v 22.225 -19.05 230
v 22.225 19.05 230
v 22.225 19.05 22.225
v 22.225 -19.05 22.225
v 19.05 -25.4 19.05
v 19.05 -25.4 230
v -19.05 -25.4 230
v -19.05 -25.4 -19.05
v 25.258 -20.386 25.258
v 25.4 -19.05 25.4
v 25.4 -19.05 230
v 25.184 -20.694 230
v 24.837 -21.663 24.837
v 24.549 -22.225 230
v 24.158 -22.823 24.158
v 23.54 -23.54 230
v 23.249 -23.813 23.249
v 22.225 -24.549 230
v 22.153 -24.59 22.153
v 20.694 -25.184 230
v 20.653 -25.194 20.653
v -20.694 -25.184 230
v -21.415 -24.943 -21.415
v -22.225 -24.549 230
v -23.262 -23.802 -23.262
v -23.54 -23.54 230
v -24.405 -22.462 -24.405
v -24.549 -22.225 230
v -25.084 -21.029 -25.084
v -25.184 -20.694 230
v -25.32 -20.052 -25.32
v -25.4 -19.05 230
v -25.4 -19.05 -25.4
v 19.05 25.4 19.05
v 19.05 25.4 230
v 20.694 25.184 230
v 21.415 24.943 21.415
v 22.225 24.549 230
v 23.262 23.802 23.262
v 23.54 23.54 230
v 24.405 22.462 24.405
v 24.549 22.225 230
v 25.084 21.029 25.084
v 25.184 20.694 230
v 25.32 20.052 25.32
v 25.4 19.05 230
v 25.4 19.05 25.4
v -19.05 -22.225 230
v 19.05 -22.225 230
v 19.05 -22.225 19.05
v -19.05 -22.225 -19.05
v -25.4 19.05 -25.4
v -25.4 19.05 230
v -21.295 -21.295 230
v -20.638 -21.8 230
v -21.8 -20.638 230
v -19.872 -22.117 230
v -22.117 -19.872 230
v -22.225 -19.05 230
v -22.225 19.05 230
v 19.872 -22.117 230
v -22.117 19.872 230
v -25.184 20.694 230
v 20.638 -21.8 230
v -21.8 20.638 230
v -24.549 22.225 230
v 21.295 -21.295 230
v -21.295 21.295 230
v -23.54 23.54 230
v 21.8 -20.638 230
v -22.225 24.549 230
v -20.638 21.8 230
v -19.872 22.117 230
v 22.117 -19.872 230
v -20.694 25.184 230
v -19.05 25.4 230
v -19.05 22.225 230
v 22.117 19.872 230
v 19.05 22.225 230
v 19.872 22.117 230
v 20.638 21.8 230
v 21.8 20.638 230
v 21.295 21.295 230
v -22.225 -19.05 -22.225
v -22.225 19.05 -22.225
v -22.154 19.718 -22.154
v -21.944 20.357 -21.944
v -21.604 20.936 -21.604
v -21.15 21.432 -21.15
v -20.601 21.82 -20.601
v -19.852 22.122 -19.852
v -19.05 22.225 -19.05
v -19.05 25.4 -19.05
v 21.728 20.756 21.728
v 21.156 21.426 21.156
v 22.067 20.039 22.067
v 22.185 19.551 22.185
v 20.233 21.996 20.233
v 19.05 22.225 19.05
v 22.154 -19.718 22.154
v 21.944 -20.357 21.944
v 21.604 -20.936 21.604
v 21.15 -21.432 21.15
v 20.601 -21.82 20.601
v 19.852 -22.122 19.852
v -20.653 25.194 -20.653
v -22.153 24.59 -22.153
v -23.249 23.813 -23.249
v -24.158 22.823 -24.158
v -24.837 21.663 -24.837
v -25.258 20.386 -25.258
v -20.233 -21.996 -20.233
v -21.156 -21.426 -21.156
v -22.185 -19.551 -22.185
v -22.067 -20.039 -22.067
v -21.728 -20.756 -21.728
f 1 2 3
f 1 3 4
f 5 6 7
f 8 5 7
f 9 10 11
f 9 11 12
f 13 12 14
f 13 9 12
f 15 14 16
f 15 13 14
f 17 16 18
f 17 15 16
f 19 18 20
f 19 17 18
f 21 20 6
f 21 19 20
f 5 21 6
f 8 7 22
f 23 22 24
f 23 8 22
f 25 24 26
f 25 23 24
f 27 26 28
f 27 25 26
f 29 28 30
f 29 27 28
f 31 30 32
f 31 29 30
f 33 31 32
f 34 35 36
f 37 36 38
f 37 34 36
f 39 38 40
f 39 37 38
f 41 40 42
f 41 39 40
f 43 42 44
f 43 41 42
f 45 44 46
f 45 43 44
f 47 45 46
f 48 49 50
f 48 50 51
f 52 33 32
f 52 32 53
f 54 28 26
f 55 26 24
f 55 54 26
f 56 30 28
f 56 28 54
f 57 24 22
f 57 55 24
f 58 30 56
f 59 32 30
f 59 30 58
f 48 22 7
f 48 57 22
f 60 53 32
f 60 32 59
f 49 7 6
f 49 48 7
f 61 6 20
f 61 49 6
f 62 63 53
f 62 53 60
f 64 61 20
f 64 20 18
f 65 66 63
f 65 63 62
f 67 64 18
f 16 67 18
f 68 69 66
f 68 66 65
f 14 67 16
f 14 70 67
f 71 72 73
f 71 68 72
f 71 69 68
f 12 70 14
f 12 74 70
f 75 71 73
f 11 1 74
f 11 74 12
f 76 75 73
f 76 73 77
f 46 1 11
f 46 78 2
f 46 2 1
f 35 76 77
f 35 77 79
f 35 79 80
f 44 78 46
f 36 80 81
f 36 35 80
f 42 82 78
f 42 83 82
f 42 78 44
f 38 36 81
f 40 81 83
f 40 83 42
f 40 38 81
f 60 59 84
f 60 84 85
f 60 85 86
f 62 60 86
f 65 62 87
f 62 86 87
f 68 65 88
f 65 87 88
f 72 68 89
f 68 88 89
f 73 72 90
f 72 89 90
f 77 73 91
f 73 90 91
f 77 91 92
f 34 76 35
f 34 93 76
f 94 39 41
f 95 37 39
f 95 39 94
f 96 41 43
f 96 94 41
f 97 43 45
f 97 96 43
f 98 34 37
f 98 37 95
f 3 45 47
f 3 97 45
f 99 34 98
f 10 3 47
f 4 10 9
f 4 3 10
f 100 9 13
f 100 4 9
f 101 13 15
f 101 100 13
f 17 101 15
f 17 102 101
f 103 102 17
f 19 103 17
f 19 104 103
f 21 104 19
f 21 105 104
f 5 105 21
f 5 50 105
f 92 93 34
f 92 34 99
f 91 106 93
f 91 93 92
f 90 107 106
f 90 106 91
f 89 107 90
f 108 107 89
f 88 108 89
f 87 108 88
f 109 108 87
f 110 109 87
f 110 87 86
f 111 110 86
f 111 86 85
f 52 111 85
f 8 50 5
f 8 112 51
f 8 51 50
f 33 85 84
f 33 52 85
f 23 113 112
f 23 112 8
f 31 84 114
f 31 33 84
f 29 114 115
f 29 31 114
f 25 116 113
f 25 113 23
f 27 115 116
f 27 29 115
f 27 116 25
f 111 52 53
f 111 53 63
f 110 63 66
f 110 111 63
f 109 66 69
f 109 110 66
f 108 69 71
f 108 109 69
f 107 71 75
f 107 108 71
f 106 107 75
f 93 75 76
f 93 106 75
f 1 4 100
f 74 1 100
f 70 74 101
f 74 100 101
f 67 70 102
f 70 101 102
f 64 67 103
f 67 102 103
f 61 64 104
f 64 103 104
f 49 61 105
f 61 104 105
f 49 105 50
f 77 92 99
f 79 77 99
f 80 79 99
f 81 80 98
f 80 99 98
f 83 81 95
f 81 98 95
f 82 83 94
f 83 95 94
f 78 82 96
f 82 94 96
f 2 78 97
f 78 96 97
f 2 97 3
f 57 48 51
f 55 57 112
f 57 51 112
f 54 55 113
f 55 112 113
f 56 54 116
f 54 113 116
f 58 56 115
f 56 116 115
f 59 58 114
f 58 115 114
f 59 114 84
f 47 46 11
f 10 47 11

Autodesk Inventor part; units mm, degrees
ref_plane "Plano inicial" through (0, 0, -25.4) normal (0, 0, 1) x (1, 0, 0)
ref_plane "Plano final" through (0, 0, 230) normal (0, 0, 1) x (1, 0, 0)
sketch "Boceto" plane through (0, 0, 0) normal (0, 0, 1) x (1, 0, 0)
  line L0 (-25.4, -19.05) -> (-25.4, 19.05)
  line L1 (-19.05, 25.4) -> (19.05, 25.4)
  line L2 (25.4, 19.05) -> (25.4, -19.05)
  line L3 (19.05, -25.4) -> (-19.05, -25.4)
  arc A0 (-25.4, -19.05) -> (-19.05, -25.4) centre (-19.05, -19.05) ccw
  arc A1 (-19.05, 25.4) -> (-25.4, 19.05) centre (-19.05, 19.05) ccw
  arc A2 (25.4, 19.05) -> (19.05, 25.4) centre (19.05, 19.05) ccw
  arc A3 (19.05, -25.4) -> (25.4, -19.05) centre (19.05, -19.05) ccw
  arc A4 (-19.05, 22.225) -> (-22.225, 19.05) centre (-19.05, 19.05) ccw
  line L4 (-19.05, 22.225) -> (19.05, 22.225)
  arc A5 (22.225, 19.05) -> (19.05, 22.225) centre (19.05, 19.05) ccw
  line L5 (22.225, 19.05) -> (22.225, -19.05)
  arc A6 (19.05, -22.225) -> (22.225, -19.05) centre (19.05, -19.05) ccw
  line L6 (19.05, -22.225) -> (-19.05, -22.225)
  arc A7 (-22.225, -19.05) -> (-19.05, -22.225) centre (-19.05, -19.05) ccw
  line L7 (-22.225, -19.05) -> (-22.225, 19.05)
  line L8 (0, 37.4012) -> (0, -37.4012) construction
  line L9 (-37.4012, 0) -> (37.4012, 0) construction
  dimension "d10" = 50.8
  dimension "d11" = 50.8
  dimension "d12" = 3.175
  dimension "d15" = 25.4
  dimension "d16" = 25.4
  dimension "d17" = 6.35
extrude "Cuerpo" add sketch "Boceto" along normal up to surface (255.4 mm away) from surface at -25.4
sketch "Sketch3" plane through (0, 0, 0) normal (0, 0, 1) x (1, 0, 0)
  line L0 (0, 0) -> (10, 0)
ref_plane "Work Plane3" through (0, 0, 0) normal (0, -1, 0) x (1, 0, 0)
ref_plane "Plano de trabajo4" through (-25.4, 0, -25.4) normal (0.7071, 0, -0.7071) x (-0.7071, 0, -0.7071)
split "Dividir1" plane through (-25.4, 0, -25.4) removes the side toward (0.7071, 0, -0.7071)
sketch "Sketch4" plane through (0, 0, 0) normal (0, -1, 0) x (1, 0, 0)
  line L0 (-2, -25.4) -> (12, -25.4) projected
  line L1 (-2, 230) -> (12, 230) projected
  dimension "d19" = 255.4
equation "\"d10\" = G_H"
equation "\"d11\" = G_W"
equation "\"d12\" = G_T"
equation "\"d15\" = 0.5 * d10"
equation "\"d16\" = 0.5 * d11"
equation "\"d17\" = G_IR"
equation "\"d3\" = G_L"
equation "\"G_W\" = 50.8"
equation "\"G_H\" = 50.8"
equation "\"G_T\" = 3.175"
equation "\"G_IR\" = 6.35"
equation "\"G_L\" = d19"
equation "\"G_OFFSET_START\" = 25.4"
equation "\"G_OFFSET_END\" = 0"
equation "\"d13\" = -G_OFFSET_START"
properties part number "AISC - 2 x 2 x 1/8 - 10,055" material "Acero, suave"
